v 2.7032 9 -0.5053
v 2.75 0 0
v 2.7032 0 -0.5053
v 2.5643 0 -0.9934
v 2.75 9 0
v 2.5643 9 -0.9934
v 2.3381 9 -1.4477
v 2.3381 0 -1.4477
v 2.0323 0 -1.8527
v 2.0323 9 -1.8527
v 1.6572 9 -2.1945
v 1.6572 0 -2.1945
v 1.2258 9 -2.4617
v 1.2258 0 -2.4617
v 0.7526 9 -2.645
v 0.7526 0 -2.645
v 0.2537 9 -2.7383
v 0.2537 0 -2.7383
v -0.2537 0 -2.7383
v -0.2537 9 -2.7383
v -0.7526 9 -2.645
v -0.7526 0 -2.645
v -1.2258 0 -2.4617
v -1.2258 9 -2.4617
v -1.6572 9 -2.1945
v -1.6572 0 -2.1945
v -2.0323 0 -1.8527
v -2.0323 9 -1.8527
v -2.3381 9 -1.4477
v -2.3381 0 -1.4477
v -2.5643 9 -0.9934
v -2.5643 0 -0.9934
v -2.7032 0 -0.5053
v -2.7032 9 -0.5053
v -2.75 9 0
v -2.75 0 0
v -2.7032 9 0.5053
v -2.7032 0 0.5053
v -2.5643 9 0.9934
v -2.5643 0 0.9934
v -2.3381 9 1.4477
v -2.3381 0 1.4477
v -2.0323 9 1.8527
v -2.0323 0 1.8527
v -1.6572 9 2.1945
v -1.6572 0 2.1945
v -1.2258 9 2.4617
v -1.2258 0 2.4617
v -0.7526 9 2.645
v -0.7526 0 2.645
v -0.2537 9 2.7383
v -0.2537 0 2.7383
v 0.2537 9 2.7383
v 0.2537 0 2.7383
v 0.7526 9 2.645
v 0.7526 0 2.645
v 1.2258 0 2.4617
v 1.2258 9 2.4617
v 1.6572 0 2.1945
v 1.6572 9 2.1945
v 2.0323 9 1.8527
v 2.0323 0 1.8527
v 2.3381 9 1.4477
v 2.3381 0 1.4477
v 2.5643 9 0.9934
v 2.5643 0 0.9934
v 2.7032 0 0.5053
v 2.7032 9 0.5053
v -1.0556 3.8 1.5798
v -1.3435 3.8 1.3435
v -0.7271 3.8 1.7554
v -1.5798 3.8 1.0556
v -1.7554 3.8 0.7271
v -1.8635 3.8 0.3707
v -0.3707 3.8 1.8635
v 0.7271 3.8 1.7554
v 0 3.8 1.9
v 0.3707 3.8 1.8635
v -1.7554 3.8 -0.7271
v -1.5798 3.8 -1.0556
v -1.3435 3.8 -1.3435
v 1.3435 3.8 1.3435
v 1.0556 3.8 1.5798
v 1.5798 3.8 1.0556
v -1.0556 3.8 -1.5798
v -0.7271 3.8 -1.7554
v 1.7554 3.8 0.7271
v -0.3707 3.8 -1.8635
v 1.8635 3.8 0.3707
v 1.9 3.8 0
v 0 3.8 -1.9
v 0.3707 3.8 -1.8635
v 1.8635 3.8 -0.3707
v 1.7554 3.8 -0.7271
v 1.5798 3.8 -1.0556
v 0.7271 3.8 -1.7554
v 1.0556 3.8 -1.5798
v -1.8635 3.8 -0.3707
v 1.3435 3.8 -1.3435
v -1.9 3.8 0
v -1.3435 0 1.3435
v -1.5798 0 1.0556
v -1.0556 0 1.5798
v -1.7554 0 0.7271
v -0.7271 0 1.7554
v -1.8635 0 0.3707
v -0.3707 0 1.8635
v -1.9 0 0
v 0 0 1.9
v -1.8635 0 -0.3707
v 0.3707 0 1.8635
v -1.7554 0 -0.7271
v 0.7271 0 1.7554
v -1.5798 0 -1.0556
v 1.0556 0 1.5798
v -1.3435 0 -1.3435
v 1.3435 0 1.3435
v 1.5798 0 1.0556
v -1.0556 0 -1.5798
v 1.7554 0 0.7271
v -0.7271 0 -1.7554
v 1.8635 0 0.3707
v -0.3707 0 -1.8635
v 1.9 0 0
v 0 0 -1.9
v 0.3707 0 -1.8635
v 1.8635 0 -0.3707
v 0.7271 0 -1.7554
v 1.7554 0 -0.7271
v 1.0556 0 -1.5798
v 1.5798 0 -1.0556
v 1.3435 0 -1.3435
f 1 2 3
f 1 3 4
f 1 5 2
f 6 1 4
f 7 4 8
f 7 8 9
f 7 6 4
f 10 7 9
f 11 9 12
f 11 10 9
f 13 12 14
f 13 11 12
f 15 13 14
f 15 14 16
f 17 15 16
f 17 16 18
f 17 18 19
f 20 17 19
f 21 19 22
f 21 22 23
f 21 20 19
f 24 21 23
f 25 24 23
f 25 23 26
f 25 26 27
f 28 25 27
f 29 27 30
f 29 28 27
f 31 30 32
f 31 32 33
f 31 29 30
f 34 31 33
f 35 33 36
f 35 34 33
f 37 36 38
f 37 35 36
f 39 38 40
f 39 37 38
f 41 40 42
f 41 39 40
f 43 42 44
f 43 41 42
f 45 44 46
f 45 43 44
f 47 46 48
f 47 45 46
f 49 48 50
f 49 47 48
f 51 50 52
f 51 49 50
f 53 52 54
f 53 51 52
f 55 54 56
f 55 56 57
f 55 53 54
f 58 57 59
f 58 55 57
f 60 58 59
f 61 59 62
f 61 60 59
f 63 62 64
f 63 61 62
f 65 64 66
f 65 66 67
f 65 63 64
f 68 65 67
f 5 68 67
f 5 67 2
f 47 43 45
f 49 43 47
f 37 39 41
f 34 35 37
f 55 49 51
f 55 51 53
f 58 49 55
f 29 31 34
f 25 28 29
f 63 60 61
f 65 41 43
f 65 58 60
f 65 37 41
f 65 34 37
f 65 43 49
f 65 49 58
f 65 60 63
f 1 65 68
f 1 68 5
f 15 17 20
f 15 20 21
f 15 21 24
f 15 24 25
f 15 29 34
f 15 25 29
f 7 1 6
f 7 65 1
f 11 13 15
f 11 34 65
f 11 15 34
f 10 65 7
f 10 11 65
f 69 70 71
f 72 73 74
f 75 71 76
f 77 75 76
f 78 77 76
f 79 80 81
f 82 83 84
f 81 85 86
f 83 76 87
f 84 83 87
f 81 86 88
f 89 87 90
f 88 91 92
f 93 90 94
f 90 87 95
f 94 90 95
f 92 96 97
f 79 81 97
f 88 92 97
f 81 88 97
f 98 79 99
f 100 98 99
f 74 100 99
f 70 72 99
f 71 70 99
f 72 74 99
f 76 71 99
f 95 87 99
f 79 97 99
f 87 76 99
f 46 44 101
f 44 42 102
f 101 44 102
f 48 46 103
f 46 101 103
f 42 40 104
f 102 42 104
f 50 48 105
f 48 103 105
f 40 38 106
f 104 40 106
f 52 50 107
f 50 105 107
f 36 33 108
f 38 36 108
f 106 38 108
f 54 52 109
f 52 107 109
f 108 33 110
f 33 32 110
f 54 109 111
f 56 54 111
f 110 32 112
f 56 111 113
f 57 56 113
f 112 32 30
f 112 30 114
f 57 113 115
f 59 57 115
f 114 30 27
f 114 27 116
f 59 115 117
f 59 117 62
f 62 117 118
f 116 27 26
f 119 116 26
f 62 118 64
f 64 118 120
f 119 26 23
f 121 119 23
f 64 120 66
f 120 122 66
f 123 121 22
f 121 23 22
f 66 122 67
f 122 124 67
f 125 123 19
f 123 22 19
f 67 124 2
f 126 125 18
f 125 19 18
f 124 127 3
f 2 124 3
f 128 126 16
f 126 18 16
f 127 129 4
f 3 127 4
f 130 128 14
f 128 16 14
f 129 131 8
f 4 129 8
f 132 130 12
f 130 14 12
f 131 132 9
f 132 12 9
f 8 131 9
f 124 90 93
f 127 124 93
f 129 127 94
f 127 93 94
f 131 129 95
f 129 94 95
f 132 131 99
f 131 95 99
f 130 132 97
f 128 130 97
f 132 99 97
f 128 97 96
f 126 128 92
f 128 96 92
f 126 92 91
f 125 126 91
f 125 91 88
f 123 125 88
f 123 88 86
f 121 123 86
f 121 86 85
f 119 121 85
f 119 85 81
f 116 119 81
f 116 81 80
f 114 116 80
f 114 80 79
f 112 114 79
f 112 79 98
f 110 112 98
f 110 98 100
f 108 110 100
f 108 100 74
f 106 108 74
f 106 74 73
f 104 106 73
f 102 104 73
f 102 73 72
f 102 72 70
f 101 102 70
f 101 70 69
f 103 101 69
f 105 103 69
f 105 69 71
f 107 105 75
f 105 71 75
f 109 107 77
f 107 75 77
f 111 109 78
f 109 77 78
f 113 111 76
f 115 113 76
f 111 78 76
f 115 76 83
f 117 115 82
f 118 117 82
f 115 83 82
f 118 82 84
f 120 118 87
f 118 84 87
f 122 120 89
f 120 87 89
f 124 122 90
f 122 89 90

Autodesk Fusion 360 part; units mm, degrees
sketch "Esboço1" plane through (0, 0, 0) normal (0, 1, 0) x (1, 0, 0)
cylinder "Cilindro primitivo1" add diameter 5.5 height 9 placed x (1, 0, 0) y (0, 0, -1) z (0, 1, 0) at (0, 0, 0) makes body 1
cylinder "Cilindro primitivo2" cut diameter 3.8 height 3.8 placed x (1, 0, 0) y (0, 0, -1) z (0, 1, 0) at (0, 0, 0) bodies 1
copy_body "Corpo -> Componente1" bodies 1 removing the originals makes body 2 in component "Component'"
component "Component'" placed x (1, 0, 0) y (0, 1, 0) z (0, 0, 1) at (0, 0, 0)
